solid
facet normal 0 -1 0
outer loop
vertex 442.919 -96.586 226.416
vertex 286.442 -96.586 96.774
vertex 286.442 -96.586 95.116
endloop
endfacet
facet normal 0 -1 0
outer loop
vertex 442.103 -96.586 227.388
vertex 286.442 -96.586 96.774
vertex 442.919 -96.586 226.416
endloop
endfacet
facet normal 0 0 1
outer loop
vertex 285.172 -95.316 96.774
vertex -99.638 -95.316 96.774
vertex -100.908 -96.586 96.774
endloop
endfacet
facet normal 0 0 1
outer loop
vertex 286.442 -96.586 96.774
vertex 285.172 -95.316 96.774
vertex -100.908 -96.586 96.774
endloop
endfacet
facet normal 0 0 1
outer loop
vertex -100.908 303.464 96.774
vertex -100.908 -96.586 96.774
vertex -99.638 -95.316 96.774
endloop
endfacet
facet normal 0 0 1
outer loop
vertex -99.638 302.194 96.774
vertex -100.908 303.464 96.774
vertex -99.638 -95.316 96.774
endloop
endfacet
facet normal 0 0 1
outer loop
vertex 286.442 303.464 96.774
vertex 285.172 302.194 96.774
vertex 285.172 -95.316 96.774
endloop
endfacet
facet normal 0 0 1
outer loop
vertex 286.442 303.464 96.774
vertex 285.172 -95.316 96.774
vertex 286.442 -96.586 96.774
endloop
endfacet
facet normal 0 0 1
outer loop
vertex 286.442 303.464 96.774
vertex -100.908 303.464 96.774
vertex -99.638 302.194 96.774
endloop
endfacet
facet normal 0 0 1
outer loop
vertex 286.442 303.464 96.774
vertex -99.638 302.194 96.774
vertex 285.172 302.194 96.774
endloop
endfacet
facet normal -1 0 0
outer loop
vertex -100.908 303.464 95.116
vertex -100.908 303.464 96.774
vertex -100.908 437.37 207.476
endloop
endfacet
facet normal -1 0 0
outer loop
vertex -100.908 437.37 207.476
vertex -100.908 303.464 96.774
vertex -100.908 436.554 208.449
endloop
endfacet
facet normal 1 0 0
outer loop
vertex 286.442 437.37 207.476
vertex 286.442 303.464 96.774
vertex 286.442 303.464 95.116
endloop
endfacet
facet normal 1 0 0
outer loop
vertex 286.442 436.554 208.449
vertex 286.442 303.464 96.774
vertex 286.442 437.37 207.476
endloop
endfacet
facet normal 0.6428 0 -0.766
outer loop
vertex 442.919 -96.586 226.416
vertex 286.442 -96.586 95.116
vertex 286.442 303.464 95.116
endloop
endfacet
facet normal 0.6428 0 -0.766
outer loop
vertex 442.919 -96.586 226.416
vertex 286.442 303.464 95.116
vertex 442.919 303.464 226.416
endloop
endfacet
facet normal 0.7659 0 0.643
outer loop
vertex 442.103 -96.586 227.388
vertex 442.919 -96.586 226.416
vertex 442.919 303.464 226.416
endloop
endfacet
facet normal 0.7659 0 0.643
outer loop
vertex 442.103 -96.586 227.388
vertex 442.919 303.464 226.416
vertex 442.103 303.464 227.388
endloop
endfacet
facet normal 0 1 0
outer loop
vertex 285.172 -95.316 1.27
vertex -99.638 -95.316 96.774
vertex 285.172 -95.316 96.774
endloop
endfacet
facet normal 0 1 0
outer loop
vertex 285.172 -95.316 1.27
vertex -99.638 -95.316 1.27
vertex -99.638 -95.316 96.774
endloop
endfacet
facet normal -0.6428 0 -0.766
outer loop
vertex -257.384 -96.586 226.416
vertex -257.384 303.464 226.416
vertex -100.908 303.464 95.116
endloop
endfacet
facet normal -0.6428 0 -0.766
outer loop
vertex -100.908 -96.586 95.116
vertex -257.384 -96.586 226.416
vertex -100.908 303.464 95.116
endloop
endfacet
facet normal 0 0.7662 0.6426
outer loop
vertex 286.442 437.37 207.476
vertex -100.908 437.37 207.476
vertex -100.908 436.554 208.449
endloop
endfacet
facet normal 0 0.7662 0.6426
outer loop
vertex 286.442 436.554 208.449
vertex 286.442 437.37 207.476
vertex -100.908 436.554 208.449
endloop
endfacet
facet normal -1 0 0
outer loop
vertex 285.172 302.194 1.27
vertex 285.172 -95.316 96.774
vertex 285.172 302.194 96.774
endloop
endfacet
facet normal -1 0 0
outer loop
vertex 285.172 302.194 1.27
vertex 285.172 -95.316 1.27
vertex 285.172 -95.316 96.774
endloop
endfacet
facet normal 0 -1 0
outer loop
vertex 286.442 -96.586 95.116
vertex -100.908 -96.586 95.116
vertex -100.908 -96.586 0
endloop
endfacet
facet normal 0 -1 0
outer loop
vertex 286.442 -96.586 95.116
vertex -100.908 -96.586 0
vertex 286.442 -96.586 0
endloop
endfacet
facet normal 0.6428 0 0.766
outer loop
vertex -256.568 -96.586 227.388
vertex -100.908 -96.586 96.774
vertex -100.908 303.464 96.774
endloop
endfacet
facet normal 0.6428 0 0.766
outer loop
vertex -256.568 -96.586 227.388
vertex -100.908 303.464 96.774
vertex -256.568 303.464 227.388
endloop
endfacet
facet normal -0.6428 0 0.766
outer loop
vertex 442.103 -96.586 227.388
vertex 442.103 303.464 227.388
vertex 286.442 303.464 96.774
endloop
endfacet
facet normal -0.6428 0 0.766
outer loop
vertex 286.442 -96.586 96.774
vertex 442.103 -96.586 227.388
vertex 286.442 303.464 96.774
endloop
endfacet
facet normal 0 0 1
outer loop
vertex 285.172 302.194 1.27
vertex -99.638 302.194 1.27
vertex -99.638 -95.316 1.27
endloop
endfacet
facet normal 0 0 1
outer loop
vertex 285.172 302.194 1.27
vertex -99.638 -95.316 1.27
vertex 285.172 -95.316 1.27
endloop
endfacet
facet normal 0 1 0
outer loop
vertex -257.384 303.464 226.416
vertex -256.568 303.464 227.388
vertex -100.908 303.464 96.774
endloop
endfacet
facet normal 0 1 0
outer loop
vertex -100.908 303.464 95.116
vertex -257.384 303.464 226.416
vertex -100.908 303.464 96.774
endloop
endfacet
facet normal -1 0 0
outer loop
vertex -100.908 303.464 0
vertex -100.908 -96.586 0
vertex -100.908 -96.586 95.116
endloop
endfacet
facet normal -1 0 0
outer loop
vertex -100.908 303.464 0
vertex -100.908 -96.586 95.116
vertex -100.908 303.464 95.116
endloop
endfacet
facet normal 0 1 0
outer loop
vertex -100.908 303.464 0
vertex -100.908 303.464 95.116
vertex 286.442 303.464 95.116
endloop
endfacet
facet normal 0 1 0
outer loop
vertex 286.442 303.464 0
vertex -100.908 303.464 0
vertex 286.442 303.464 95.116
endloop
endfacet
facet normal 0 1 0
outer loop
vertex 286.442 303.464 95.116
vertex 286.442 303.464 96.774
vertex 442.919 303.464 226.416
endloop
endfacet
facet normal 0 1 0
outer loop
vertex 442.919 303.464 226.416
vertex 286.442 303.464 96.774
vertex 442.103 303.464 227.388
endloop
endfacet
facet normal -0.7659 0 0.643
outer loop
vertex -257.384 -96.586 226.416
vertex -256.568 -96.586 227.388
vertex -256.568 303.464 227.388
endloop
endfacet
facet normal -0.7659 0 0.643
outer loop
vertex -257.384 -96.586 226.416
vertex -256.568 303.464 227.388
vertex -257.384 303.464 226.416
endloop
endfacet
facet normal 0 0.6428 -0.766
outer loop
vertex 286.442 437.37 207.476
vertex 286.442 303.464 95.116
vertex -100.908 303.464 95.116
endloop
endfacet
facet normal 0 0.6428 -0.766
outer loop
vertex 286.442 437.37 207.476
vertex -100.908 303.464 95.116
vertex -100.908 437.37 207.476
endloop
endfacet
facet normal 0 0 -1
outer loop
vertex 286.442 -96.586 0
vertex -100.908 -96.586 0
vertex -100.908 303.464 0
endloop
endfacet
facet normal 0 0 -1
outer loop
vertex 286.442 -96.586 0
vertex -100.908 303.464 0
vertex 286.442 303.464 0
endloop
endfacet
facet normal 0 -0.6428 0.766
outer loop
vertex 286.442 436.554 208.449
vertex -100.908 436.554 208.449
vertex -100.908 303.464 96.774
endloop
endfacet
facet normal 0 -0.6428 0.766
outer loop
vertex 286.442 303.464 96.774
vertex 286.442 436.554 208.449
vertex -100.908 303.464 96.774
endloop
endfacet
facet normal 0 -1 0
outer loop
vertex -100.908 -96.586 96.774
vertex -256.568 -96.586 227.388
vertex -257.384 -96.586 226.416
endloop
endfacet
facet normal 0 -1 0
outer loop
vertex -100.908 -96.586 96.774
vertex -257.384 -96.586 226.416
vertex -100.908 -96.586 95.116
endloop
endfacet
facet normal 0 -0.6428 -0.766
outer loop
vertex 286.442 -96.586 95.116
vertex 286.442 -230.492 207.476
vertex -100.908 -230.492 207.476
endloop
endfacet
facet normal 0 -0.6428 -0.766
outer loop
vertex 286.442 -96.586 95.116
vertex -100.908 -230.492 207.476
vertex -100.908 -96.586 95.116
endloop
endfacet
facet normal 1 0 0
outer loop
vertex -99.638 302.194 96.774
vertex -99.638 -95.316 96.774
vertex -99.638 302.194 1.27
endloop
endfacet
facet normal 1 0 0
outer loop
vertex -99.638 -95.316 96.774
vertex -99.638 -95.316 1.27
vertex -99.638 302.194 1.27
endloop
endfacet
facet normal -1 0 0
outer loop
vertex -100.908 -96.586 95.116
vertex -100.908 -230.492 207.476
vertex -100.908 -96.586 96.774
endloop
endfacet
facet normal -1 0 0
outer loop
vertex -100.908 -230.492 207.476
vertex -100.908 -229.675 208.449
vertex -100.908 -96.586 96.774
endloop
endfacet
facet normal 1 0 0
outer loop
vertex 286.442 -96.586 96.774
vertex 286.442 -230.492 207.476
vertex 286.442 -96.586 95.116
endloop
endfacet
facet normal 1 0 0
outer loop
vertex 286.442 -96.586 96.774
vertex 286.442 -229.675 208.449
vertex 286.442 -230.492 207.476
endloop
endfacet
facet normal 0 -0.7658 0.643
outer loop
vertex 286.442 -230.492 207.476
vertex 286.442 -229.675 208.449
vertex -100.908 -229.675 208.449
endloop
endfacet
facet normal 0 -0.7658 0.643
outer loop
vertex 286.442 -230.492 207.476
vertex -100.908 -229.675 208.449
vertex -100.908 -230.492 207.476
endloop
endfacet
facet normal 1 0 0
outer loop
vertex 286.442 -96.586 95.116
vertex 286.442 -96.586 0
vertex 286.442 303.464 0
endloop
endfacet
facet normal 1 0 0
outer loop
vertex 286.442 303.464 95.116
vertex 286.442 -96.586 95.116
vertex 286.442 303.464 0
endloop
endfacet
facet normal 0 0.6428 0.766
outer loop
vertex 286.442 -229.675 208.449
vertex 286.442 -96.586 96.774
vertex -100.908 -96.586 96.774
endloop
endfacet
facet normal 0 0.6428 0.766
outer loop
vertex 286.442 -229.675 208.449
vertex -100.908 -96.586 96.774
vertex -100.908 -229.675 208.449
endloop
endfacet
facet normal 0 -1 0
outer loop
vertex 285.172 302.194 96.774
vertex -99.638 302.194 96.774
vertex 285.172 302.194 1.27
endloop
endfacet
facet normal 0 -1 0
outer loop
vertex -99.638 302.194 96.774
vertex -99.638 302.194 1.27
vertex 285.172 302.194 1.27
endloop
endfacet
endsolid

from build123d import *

# Parameters (mm, degrees)
F0_W     = 387.35
F0_H     = 400.05
F1_DEPTH = 96.774
F2_T     = -1.27
F4_DEPTH = 400.05
F6_DEPTH = 387.35


with BuildPart() as f1:
    # F0 (on Top) → F1 (new body)
    with BuildSketch(Plane.XY):
        with Locations((92.767464, 103.439062)):
            Rectangle(F0_W, F0_H)
    extrude(amount=F1_DEPTH)

    # F2
    f2_openings = [f1.faces().sort_by_distance(p)[0] for p in [
        (92.767464, 103.439062, 96.774),
    ]]
    offset(amount=F2_T, openings=f2_openings)

    # F3 (on face) → F4 (join)
    with BuildSketch(Plane.XZ.offset(96.585938)):
        Polygon((-100.907536, 95.116133), (-100.907536, 96.774), (-256.567766, 227.388442), (-257.384107, 226.415566), align=None)
        Polygon((442.102695, 227.388442), (286.442464, 96.774), (286.442464, 95.116133), (442.919036, 226.415566), align=None)
    extrude(amount=-F4_DEPTH)

    # F5 (on face) → F6 (join)
    with BuildSketch(Plane.YZ.offset(286.442464)):
        Polygon((303.464062, 96.774), (303.464062, 95.116133), (437.3699, 207.476472), (436.553559, 208.449348), align=None)
        Polygon((-230.491776, 207.476472), (-96.585938, 95.116133), (-96.585938, 96.774), (-229.675435, 208.449348), align=None)
    extrude(amount=-F6_DEPTH)


solid = f1.part
